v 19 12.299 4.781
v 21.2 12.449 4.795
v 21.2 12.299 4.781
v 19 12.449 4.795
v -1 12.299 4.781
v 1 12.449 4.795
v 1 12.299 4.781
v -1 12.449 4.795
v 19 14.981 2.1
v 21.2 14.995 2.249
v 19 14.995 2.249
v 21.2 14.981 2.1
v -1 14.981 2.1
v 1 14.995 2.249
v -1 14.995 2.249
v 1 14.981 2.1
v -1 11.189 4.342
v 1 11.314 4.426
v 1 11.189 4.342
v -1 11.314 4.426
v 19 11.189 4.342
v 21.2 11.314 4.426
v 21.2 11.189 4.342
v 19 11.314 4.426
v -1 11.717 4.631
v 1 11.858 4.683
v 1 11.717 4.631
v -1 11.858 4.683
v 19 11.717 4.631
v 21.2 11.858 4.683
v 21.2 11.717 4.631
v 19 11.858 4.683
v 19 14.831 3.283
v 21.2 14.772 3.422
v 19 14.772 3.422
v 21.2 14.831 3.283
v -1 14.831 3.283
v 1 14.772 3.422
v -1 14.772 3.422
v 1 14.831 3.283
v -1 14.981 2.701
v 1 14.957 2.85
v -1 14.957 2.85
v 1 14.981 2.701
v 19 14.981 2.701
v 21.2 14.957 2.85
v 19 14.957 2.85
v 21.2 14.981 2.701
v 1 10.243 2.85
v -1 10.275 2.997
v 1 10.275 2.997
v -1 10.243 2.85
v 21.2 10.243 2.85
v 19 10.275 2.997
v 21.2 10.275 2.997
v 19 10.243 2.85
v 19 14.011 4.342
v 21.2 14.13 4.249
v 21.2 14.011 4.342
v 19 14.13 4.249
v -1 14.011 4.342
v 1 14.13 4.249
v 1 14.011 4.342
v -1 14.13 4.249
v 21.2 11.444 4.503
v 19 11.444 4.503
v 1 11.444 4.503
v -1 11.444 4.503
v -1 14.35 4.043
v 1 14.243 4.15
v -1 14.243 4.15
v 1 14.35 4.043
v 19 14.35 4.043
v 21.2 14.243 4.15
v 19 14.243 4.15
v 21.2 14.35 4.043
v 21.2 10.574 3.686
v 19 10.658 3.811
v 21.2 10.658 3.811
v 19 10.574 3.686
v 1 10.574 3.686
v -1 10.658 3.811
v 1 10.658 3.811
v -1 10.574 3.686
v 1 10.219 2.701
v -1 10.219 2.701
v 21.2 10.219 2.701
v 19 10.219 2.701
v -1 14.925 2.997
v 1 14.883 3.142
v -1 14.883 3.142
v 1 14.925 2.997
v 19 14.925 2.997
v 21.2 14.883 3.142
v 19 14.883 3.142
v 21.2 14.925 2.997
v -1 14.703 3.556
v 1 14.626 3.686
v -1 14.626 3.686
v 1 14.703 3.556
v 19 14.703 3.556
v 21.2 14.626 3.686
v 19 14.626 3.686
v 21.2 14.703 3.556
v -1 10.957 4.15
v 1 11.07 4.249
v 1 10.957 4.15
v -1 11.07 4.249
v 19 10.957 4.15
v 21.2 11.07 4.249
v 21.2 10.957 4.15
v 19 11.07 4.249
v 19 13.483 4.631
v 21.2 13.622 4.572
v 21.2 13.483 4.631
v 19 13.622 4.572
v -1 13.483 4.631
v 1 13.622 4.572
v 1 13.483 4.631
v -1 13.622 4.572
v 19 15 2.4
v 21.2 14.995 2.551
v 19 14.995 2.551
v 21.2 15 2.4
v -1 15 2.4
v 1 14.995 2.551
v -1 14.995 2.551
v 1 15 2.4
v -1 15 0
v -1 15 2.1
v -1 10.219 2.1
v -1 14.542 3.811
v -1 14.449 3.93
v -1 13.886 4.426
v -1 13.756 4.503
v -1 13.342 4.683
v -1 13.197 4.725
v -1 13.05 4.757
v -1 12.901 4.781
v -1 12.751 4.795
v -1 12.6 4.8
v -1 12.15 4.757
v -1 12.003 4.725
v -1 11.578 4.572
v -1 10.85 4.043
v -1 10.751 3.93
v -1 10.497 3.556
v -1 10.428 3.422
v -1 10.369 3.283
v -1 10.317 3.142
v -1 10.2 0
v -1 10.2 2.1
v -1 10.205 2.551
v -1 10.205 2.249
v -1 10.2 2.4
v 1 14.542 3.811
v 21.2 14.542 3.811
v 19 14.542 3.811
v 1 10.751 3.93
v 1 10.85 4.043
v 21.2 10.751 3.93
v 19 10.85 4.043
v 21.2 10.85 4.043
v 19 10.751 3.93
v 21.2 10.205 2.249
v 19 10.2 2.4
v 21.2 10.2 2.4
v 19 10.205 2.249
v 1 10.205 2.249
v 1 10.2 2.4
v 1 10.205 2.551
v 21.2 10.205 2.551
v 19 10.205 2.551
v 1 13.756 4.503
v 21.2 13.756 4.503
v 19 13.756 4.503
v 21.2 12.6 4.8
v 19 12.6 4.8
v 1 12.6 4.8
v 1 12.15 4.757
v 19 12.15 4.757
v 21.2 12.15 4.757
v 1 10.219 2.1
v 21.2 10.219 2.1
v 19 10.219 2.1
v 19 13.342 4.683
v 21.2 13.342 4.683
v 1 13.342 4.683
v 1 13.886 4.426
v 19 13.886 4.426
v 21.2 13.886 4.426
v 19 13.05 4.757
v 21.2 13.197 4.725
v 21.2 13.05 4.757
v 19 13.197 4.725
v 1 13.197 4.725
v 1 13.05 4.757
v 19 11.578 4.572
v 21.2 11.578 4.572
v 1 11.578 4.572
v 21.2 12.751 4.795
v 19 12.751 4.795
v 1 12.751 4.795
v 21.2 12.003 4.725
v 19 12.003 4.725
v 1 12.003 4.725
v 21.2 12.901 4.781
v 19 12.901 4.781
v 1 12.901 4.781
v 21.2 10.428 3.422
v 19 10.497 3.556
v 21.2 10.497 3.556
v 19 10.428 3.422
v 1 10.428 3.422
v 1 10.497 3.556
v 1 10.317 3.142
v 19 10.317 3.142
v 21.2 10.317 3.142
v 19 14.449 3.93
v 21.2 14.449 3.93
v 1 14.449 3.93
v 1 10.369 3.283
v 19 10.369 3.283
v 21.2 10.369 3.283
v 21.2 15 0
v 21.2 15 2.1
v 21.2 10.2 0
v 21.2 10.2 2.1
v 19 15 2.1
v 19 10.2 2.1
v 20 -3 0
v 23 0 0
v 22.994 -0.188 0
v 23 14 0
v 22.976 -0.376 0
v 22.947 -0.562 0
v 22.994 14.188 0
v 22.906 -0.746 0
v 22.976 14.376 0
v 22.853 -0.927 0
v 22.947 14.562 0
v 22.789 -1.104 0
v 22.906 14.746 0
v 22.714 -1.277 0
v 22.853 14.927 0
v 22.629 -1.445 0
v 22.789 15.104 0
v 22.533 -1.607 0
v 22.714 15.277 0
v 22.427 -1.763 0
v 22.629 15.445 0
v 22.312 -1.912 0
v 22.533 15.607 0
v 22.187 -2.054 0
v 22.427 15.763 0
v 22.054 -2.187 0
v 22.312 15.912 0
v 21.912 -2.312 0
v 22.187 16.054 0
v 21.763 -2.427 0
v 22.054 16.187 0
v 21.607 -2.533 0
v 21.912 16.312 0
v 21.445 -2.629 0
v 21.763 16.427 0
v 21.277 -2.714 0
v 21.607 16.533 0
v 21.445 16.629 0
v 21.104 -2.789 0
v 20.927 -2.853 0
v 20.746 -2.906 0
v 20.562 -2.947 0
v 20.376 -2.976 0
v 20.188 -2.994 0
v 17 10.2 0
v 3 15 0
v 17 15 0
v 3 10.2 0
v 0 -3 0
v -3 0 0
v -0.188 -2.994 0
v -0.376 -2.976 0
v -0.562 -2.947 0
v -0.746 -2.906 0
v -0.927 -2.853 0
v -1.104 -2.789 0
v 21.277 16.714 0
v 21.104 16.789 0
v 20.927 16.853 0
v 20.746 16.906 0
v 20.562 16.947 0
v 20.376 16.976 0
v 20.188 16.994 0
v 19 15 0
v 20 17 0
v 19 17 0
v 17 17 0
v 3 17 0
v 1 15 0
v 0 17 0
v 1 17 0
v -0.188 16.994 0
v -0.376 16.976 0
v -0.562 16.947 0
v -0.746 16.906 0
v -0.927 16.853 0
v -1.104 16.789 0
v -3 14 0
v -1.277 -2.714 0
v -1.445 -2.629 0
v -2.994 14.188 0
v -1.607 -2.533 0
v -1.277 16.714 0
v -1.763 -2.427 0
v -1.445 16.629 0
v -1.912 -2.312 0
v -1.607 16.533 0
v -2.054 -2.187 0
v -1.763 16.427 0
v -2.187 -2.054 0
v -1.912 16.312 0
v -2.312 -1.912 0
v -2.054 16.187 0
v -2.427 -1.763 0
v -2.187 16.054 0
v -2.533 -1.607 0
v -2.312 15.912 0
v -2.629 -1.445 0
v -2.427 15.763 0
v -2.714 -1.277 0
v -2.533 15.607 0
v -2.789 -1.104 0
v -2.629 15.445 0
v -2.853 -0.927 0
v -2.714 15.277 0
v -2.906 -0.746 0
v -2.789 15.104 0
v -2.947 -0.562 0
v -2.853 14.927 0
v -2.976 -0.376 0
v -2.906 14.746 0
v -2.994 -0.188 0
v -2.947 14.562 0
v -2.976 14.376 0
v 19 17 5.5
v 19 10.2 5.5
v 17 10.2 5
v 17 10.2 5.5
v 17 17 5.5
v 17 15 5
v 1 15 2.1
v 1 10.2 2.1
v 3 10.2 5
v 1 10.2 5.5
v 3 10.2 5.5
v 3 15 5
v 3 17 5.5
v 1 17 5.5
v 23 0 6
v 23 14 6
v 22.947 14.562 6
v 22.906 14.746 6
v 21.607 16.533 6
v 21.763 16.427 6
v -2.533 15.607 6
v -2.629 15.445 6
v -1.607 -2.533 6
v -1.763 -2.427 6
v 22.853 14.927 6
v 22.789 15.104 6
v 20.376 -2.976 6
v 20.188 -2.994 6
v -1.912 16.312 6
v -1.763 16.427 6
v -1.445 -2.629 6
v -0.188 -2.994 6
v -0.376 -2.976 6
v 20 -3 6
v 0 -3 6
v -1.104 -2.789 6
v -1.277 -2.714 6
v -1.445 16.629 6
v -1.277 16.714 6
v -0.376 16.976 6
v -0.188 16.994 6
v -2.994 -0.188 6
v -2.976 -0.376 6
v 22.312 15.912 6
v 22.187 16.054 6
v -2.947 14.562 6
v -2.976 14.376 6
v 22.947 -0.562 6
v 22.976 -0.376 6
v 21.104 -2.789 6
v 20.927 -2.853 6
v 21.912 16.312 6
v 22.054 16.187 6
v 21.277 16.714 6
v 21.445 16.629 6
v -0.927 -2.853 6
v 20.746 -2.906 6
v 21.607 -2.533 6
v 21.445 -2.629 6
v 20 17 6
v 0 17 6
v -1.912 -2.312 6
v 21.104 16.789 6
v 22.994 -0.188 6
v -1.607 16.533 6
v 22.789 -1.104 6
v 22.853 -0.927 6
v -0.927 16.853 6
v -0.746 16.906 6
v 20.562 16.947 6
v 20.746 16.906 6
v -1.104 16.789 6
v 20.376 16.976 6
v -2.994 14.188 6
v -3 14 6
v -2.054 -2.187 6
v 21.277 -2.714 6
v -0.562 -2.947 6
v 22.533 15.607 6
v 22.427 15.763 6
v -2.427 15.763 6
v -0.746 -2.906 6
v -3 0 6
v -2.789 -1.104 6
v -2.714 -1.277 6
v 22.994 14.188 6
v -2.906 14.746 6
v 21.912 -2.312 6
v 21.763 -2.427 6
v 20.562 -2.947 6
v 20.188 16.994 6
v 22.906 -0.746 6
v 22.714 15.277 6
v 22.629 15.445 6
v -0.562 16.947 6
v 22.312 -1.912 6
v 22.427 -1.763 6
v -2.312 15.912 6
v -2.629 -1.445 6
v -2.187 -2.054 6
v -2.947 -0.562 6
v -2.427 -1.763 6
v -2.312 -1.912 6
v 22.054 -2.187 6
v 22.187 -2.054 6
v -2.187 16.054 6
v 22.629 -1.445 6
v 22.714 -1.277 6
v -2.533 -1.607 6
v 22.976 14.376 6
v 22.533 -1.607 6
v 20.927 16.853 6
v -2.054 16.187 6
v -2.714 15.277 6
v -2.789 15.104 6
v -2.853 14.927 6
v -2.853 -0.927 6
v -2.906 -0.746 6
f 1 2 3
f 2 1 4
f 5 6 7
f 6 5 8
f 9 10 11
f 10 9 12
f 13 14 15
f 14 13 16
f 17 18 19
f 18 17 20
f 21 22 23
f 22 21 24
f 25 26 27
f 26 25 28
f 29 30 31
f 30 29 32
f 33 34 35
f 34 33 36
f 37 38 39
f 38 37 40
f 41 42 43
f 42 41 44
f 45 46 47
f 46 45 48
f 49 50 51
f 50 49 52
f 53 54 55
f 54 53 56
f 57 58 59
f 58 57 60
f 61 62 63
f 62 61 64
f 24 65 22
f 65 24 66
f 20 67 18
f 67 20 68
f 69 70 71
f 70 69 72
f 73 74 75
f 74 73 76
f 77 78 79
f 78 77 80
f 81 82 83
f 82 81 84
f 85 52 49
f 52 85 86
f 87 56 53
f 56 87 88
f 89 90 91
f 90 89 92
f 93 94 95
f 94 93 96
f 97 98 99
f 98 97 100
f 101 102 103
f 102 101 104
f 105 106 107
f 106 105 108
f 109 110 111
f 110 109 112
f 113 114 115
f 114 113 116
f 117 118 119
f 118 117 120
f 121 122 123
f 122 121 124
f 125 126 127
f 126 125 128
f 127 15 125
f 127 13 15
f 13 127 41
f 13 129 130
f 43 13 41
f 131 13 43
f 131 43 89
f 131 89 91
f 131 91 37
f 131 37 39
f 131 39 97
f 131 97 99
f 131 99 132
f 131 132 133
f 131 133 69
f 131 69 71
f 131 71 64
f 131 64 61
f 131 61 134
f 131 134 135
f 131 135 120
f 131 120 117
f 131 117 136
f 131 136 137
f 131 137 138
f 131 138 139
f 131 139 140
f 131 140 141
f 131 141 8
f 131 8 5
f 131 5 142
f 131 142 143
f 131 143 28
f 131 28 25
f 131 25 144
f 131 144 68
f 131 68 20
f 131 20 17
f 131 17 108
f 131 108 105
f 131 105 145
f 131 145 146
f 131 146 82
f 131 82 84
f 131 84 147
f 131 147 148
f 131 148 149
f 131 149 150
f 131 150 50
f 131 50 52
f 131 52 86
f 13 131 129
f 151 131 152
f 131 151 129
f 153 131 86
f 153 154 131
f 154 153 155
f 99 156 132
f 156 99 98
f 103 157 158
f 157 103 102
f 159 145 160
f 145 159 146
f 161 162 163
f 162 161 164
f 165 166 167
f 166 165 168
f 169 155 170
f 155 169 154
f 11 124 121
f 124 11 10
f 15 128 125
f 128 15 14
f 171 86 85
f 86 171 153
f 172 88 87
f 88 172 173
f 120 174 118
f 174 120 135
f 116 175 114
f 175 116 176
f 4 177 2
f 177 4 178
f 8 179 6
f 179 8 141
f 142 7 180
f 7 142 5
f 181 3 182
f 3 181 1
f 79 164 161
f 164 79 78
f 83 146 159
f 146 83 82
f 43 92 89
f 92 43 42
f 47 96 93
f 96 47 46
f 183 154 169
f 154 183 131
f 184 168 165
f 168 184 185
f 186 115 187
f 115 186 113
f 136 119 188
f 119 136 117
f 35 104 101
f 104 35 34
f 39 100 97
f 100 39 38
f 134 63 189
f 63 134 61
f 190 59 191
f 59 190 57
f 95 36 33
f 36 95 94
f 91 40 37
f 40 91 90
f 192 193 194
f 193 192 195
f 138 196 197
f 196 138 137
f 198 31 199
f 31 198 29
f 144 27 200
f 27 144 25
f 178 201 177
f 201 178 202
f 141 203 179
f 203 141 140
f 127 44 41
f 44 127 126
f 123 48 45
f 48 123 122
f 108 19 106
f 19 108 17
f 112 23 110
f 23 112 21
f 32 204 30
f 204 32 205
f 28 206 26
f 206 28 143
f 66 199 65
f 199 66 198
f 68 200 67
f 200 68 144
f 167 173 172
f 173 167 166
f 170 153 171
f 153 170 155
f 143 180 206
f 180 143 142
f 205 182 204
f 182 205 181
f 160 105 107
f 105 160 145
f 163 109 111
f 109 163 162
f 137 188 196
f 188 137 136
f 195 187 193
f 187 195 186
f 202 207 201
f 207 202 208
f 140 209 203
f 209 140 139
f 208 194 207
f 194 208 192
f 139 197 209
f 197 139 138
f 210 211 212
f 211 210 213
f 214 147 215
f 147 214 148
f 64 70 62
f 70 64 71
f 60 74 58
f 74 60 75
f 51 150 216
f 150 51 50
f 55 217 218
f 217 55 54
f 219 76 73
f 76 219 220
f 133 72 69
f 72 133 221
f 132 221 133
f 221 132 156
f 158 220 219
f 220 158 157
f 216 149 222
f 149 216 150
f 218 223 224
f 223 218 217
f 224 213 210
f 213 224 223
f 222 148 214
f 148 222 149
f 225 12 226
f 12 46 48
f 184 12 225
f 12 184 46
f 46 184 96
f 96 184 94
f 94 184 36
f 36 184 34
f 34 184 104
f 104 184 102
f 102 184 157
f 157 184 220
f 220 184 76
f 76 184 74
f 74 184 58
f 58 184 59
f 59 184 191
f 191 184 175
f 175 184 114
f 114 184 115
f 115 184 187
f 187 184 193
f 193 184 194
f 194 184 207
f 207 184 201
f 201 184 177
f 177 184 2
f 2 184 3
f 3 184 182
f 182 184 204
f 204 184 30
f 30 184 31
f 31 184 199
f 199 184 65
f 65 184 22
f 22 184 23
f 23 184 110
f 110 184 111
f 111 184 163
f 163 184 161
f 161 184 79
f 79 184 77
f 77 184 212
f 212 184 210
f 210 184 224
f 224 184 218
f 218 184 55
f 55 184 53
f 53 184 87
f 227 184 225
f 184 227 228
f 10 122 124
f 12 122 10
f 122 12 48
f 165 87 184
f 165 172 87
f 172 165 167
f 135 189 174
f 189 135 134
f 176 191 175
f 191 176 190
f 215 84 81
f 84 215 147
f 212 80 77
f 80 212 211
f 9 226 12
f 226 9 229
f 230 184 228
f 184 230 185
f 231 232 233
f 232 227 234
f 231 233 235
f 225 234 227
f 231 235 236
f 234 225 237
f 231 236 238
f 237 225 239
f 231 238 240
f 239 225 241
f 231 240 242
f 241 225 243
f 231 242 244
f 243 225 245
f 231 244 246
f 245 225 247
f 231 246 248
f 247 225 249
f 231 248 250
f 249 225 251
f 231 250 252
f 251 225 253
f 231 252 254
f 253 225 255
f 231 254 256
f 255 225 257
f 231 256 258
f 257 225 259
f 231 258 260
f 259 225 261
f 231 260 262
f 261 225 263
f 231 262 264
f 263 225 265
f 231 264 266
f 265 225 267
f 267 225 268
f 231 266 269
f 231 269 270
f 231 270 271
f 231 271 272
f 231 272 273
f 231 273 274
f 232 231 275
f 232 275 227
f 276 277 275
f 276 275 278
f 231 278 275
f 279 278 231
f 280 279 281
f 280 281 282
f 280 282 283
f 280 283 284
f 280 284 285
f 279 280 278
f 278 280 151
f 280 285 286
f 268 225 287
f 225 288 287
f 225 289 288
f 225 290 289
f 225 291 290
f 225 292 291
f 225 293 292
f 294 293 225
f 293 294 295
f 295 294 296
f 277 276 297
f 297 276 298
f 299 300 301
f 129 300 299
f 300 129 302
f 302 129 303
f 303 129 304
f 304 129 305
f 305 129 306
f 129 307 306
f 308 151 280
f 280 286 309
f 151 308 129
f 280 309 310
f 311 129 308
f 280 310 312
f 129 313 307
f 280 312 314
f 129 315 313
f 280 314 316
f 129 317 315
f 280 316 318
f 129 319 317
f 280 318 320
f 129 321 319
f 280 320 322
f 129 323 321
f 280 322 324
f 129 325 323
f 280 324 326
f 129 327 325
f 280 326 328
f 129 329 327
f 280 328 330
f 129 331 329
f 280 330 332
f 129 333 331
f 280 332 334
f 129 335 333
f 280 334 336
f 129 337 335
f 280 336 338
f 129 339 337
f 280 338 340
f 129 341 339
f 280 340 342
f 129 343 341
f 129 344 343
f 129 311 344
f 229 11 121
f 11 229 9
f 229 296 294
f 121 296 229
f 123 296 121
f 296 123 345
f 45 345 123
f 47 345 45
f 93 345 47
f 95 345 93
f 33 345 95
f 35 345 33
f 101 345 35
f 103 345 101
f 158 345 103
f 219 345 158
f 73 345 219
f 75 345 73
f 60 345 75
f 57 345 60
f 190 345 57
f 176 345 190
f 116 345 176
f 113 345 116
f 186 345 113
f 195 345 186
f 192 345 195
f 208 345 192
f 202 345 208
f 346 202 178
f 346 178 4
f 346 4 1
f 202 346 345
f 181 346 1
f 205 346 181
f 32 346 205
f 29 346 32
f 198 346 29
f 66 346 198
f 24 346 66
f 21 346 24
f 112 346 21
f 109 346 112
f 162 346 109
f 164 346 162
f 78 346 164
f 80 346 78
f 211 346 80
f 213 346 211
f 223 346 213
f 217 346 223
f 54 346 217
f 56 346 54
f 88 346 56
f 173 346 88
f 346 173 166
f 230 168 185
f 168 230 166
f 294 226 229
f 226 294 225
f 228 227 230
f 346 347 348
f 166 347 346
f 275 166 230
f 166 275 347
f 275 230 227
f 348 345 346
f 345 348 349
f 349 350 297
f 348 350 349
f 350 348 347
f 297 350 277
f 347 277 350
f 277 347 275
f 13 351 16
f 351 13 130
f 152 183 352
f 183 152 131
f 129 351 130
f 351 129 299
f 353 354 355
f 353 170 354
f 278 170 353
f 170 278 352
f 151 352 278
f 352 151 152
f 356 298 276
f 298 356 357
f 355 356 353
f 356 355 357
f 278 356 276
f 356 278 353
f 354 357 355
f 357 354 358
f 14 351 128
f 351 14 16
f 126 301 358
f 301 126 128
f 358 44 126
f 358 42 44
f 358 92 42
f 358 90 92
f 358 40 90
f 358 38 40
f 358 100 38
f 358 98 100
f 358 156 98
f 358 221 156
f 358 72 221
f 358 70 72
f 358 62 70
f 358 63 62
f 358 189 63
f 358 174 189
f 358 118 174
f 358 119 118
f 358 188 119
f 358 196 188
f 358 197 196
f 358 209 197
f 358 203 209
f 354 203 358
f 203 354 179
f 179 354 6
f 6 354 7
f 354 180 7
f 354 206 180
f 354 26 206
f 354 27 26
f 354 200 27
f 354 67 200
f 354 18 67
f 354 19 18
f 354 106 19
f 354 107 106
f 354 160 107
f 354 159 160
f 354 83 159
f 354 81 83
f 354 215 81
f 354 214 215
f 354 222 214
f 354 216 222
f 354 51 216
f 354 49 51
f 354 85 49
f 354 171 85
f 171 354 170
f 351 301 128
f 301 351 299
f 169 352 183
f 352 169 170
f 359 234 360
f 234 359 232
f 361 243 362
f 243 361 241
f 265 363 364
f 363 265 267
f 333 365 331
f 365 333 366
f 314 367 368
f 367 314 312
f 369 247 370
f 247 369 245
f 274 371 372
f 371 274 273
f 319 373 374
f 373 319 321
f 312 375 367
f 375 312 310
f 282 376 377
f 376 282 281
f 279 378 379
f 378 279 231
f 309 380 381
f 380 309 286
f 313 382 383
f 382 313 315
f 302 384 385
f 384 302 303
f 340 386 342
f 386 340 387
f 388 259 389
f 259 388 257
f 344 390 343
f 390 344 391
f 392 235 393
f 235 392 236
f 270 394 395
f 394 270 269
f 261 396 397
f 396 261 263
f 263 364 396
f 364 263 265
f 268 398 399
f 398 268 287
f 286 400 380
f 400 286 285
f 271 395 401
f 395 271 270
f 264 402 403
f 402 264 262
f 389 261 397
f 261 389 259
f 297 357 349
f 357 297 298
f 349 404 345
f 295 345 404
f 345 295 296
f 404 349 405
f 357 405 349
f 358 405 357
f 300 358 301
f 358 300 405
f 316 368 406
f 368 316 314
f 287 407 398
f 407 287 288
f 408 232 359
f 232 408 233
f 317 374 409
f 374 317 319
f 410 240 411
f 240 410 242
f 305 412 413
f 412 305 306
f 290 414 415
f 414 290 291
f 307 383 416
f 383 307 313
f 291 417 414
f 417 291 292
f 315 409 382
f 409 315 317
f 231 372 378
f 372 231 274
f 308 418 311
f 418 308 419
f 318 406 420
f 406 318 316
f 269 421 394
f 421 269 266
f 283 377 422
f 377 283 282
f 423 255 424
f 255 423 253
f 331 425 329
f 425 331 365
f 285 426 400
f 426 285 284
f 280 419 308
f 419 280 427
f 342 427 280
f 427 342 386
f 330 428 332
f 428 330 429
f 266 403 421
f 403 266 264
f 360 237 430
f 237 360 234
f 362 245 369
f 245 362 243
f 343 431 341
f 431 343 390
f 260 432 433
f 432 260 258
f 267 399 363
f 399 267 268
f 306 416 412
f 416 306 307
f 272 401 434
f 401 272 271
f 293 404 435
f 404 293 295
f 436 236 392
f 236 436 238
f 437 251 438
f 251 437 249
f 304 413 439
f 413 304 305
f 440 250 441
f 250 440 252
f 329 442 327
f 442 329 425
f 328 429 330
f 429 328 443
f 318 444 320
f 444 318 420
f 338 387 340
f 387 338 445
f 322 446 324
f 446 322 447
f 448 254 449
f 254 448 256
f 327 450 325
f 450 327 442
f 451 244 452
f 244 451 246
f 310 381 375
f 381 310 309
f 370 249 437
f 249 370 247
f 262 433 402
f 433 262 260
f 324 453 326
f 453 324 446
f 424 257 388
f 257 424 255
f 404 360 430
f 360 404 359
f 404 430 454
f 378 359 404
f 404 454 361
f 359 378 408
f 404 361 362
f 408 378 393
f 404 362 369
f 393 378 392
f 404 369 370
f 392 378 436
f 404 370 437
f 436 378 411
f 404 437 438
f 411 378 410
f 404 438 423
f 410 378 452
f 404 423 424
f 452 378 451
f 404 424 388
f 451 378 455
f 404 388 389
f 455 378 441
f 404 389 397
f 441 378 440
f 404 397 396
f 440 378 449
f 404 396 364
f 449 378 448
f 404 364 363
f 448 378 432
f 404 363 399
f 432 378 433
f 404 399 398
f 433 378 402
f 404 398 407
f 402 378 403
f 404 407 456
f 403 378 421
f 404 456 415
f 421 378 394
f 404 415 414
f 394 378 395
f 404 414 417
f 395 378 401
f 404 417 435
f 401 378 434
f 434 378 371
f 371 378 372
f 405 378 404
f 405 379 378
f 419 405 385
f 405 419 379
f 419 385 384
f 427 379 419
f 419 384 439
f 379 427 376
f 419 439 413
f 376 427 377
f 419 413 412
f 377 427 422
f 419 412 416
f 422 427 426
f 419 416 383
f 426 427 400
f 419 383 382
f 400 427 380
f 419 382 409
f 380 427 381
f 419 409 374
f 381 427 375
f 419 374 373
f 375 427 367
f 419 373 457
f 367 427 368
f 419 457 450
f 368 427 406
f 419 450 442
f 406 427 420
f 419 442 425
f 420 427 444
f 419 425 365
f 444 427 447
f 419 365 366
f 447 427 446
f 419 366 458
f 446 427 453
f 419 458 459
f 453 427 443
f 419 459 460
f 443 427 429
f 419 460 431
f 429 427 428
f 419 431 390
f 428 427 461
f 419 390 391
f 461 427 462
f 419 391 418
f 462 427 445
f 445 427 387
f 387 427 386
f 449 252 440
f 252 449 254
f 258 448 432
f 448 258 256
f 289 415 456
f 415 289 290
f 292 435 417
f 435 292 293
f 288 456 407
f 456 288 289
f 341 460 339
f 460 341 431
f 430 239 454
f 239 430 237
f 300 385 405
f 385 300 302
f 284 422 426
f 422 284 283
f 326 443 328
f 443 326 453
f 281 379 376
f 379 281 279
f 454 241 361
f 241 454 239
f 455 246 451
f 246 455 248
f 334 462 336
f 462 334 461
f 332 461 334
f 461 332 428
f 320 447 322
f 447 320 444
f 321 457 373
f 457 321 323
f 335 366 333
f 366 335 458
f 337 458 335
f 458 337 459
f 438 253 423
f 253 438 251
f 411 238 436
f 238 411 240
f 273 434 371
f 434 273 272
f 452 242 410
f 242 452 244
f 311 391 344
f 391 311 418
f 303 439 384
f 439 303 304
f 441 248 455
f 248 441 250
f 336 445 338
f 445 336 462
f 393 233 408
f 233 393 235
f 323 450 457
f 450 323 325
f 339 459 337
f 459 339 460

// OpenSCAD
$fn=100;

stand1();

module stand0(){
    difference(){
        union(){
            translate([-4,-1.5,2])
            rotate([0,90,0])
            cylinder(r=2,h=22);

            minkowski()
            {
              cube([14,55,1.5]);
              cylinder(r=2,h=1.5);
            }
        }

        translate([0,-4,0])cube([14,10,4]);
    }
}

module stand1(){
    difference(){
        minkowski()
        {
          cube([20,14,3]);
          cylinder(r=3,h=3);
        }

        difference(){
            union(){
                translate([-1,12.6,2.4])rotate([0,90,0])cylinder(r=2.4,h=22.2);
                
                translate([19,10.2,0])cube([2.2,4.8,2.1]);
                translate([17,10.2,0])cube([2,8,5.5]);
                
                translate([-1,10.2,0])cube([2.2,4.8,2.1]);
                translate([1,10.2,0])cube([2,8,5.5]);
            }
            translate([3,10,0])cube([14,5,5]);
        }
    }
}
